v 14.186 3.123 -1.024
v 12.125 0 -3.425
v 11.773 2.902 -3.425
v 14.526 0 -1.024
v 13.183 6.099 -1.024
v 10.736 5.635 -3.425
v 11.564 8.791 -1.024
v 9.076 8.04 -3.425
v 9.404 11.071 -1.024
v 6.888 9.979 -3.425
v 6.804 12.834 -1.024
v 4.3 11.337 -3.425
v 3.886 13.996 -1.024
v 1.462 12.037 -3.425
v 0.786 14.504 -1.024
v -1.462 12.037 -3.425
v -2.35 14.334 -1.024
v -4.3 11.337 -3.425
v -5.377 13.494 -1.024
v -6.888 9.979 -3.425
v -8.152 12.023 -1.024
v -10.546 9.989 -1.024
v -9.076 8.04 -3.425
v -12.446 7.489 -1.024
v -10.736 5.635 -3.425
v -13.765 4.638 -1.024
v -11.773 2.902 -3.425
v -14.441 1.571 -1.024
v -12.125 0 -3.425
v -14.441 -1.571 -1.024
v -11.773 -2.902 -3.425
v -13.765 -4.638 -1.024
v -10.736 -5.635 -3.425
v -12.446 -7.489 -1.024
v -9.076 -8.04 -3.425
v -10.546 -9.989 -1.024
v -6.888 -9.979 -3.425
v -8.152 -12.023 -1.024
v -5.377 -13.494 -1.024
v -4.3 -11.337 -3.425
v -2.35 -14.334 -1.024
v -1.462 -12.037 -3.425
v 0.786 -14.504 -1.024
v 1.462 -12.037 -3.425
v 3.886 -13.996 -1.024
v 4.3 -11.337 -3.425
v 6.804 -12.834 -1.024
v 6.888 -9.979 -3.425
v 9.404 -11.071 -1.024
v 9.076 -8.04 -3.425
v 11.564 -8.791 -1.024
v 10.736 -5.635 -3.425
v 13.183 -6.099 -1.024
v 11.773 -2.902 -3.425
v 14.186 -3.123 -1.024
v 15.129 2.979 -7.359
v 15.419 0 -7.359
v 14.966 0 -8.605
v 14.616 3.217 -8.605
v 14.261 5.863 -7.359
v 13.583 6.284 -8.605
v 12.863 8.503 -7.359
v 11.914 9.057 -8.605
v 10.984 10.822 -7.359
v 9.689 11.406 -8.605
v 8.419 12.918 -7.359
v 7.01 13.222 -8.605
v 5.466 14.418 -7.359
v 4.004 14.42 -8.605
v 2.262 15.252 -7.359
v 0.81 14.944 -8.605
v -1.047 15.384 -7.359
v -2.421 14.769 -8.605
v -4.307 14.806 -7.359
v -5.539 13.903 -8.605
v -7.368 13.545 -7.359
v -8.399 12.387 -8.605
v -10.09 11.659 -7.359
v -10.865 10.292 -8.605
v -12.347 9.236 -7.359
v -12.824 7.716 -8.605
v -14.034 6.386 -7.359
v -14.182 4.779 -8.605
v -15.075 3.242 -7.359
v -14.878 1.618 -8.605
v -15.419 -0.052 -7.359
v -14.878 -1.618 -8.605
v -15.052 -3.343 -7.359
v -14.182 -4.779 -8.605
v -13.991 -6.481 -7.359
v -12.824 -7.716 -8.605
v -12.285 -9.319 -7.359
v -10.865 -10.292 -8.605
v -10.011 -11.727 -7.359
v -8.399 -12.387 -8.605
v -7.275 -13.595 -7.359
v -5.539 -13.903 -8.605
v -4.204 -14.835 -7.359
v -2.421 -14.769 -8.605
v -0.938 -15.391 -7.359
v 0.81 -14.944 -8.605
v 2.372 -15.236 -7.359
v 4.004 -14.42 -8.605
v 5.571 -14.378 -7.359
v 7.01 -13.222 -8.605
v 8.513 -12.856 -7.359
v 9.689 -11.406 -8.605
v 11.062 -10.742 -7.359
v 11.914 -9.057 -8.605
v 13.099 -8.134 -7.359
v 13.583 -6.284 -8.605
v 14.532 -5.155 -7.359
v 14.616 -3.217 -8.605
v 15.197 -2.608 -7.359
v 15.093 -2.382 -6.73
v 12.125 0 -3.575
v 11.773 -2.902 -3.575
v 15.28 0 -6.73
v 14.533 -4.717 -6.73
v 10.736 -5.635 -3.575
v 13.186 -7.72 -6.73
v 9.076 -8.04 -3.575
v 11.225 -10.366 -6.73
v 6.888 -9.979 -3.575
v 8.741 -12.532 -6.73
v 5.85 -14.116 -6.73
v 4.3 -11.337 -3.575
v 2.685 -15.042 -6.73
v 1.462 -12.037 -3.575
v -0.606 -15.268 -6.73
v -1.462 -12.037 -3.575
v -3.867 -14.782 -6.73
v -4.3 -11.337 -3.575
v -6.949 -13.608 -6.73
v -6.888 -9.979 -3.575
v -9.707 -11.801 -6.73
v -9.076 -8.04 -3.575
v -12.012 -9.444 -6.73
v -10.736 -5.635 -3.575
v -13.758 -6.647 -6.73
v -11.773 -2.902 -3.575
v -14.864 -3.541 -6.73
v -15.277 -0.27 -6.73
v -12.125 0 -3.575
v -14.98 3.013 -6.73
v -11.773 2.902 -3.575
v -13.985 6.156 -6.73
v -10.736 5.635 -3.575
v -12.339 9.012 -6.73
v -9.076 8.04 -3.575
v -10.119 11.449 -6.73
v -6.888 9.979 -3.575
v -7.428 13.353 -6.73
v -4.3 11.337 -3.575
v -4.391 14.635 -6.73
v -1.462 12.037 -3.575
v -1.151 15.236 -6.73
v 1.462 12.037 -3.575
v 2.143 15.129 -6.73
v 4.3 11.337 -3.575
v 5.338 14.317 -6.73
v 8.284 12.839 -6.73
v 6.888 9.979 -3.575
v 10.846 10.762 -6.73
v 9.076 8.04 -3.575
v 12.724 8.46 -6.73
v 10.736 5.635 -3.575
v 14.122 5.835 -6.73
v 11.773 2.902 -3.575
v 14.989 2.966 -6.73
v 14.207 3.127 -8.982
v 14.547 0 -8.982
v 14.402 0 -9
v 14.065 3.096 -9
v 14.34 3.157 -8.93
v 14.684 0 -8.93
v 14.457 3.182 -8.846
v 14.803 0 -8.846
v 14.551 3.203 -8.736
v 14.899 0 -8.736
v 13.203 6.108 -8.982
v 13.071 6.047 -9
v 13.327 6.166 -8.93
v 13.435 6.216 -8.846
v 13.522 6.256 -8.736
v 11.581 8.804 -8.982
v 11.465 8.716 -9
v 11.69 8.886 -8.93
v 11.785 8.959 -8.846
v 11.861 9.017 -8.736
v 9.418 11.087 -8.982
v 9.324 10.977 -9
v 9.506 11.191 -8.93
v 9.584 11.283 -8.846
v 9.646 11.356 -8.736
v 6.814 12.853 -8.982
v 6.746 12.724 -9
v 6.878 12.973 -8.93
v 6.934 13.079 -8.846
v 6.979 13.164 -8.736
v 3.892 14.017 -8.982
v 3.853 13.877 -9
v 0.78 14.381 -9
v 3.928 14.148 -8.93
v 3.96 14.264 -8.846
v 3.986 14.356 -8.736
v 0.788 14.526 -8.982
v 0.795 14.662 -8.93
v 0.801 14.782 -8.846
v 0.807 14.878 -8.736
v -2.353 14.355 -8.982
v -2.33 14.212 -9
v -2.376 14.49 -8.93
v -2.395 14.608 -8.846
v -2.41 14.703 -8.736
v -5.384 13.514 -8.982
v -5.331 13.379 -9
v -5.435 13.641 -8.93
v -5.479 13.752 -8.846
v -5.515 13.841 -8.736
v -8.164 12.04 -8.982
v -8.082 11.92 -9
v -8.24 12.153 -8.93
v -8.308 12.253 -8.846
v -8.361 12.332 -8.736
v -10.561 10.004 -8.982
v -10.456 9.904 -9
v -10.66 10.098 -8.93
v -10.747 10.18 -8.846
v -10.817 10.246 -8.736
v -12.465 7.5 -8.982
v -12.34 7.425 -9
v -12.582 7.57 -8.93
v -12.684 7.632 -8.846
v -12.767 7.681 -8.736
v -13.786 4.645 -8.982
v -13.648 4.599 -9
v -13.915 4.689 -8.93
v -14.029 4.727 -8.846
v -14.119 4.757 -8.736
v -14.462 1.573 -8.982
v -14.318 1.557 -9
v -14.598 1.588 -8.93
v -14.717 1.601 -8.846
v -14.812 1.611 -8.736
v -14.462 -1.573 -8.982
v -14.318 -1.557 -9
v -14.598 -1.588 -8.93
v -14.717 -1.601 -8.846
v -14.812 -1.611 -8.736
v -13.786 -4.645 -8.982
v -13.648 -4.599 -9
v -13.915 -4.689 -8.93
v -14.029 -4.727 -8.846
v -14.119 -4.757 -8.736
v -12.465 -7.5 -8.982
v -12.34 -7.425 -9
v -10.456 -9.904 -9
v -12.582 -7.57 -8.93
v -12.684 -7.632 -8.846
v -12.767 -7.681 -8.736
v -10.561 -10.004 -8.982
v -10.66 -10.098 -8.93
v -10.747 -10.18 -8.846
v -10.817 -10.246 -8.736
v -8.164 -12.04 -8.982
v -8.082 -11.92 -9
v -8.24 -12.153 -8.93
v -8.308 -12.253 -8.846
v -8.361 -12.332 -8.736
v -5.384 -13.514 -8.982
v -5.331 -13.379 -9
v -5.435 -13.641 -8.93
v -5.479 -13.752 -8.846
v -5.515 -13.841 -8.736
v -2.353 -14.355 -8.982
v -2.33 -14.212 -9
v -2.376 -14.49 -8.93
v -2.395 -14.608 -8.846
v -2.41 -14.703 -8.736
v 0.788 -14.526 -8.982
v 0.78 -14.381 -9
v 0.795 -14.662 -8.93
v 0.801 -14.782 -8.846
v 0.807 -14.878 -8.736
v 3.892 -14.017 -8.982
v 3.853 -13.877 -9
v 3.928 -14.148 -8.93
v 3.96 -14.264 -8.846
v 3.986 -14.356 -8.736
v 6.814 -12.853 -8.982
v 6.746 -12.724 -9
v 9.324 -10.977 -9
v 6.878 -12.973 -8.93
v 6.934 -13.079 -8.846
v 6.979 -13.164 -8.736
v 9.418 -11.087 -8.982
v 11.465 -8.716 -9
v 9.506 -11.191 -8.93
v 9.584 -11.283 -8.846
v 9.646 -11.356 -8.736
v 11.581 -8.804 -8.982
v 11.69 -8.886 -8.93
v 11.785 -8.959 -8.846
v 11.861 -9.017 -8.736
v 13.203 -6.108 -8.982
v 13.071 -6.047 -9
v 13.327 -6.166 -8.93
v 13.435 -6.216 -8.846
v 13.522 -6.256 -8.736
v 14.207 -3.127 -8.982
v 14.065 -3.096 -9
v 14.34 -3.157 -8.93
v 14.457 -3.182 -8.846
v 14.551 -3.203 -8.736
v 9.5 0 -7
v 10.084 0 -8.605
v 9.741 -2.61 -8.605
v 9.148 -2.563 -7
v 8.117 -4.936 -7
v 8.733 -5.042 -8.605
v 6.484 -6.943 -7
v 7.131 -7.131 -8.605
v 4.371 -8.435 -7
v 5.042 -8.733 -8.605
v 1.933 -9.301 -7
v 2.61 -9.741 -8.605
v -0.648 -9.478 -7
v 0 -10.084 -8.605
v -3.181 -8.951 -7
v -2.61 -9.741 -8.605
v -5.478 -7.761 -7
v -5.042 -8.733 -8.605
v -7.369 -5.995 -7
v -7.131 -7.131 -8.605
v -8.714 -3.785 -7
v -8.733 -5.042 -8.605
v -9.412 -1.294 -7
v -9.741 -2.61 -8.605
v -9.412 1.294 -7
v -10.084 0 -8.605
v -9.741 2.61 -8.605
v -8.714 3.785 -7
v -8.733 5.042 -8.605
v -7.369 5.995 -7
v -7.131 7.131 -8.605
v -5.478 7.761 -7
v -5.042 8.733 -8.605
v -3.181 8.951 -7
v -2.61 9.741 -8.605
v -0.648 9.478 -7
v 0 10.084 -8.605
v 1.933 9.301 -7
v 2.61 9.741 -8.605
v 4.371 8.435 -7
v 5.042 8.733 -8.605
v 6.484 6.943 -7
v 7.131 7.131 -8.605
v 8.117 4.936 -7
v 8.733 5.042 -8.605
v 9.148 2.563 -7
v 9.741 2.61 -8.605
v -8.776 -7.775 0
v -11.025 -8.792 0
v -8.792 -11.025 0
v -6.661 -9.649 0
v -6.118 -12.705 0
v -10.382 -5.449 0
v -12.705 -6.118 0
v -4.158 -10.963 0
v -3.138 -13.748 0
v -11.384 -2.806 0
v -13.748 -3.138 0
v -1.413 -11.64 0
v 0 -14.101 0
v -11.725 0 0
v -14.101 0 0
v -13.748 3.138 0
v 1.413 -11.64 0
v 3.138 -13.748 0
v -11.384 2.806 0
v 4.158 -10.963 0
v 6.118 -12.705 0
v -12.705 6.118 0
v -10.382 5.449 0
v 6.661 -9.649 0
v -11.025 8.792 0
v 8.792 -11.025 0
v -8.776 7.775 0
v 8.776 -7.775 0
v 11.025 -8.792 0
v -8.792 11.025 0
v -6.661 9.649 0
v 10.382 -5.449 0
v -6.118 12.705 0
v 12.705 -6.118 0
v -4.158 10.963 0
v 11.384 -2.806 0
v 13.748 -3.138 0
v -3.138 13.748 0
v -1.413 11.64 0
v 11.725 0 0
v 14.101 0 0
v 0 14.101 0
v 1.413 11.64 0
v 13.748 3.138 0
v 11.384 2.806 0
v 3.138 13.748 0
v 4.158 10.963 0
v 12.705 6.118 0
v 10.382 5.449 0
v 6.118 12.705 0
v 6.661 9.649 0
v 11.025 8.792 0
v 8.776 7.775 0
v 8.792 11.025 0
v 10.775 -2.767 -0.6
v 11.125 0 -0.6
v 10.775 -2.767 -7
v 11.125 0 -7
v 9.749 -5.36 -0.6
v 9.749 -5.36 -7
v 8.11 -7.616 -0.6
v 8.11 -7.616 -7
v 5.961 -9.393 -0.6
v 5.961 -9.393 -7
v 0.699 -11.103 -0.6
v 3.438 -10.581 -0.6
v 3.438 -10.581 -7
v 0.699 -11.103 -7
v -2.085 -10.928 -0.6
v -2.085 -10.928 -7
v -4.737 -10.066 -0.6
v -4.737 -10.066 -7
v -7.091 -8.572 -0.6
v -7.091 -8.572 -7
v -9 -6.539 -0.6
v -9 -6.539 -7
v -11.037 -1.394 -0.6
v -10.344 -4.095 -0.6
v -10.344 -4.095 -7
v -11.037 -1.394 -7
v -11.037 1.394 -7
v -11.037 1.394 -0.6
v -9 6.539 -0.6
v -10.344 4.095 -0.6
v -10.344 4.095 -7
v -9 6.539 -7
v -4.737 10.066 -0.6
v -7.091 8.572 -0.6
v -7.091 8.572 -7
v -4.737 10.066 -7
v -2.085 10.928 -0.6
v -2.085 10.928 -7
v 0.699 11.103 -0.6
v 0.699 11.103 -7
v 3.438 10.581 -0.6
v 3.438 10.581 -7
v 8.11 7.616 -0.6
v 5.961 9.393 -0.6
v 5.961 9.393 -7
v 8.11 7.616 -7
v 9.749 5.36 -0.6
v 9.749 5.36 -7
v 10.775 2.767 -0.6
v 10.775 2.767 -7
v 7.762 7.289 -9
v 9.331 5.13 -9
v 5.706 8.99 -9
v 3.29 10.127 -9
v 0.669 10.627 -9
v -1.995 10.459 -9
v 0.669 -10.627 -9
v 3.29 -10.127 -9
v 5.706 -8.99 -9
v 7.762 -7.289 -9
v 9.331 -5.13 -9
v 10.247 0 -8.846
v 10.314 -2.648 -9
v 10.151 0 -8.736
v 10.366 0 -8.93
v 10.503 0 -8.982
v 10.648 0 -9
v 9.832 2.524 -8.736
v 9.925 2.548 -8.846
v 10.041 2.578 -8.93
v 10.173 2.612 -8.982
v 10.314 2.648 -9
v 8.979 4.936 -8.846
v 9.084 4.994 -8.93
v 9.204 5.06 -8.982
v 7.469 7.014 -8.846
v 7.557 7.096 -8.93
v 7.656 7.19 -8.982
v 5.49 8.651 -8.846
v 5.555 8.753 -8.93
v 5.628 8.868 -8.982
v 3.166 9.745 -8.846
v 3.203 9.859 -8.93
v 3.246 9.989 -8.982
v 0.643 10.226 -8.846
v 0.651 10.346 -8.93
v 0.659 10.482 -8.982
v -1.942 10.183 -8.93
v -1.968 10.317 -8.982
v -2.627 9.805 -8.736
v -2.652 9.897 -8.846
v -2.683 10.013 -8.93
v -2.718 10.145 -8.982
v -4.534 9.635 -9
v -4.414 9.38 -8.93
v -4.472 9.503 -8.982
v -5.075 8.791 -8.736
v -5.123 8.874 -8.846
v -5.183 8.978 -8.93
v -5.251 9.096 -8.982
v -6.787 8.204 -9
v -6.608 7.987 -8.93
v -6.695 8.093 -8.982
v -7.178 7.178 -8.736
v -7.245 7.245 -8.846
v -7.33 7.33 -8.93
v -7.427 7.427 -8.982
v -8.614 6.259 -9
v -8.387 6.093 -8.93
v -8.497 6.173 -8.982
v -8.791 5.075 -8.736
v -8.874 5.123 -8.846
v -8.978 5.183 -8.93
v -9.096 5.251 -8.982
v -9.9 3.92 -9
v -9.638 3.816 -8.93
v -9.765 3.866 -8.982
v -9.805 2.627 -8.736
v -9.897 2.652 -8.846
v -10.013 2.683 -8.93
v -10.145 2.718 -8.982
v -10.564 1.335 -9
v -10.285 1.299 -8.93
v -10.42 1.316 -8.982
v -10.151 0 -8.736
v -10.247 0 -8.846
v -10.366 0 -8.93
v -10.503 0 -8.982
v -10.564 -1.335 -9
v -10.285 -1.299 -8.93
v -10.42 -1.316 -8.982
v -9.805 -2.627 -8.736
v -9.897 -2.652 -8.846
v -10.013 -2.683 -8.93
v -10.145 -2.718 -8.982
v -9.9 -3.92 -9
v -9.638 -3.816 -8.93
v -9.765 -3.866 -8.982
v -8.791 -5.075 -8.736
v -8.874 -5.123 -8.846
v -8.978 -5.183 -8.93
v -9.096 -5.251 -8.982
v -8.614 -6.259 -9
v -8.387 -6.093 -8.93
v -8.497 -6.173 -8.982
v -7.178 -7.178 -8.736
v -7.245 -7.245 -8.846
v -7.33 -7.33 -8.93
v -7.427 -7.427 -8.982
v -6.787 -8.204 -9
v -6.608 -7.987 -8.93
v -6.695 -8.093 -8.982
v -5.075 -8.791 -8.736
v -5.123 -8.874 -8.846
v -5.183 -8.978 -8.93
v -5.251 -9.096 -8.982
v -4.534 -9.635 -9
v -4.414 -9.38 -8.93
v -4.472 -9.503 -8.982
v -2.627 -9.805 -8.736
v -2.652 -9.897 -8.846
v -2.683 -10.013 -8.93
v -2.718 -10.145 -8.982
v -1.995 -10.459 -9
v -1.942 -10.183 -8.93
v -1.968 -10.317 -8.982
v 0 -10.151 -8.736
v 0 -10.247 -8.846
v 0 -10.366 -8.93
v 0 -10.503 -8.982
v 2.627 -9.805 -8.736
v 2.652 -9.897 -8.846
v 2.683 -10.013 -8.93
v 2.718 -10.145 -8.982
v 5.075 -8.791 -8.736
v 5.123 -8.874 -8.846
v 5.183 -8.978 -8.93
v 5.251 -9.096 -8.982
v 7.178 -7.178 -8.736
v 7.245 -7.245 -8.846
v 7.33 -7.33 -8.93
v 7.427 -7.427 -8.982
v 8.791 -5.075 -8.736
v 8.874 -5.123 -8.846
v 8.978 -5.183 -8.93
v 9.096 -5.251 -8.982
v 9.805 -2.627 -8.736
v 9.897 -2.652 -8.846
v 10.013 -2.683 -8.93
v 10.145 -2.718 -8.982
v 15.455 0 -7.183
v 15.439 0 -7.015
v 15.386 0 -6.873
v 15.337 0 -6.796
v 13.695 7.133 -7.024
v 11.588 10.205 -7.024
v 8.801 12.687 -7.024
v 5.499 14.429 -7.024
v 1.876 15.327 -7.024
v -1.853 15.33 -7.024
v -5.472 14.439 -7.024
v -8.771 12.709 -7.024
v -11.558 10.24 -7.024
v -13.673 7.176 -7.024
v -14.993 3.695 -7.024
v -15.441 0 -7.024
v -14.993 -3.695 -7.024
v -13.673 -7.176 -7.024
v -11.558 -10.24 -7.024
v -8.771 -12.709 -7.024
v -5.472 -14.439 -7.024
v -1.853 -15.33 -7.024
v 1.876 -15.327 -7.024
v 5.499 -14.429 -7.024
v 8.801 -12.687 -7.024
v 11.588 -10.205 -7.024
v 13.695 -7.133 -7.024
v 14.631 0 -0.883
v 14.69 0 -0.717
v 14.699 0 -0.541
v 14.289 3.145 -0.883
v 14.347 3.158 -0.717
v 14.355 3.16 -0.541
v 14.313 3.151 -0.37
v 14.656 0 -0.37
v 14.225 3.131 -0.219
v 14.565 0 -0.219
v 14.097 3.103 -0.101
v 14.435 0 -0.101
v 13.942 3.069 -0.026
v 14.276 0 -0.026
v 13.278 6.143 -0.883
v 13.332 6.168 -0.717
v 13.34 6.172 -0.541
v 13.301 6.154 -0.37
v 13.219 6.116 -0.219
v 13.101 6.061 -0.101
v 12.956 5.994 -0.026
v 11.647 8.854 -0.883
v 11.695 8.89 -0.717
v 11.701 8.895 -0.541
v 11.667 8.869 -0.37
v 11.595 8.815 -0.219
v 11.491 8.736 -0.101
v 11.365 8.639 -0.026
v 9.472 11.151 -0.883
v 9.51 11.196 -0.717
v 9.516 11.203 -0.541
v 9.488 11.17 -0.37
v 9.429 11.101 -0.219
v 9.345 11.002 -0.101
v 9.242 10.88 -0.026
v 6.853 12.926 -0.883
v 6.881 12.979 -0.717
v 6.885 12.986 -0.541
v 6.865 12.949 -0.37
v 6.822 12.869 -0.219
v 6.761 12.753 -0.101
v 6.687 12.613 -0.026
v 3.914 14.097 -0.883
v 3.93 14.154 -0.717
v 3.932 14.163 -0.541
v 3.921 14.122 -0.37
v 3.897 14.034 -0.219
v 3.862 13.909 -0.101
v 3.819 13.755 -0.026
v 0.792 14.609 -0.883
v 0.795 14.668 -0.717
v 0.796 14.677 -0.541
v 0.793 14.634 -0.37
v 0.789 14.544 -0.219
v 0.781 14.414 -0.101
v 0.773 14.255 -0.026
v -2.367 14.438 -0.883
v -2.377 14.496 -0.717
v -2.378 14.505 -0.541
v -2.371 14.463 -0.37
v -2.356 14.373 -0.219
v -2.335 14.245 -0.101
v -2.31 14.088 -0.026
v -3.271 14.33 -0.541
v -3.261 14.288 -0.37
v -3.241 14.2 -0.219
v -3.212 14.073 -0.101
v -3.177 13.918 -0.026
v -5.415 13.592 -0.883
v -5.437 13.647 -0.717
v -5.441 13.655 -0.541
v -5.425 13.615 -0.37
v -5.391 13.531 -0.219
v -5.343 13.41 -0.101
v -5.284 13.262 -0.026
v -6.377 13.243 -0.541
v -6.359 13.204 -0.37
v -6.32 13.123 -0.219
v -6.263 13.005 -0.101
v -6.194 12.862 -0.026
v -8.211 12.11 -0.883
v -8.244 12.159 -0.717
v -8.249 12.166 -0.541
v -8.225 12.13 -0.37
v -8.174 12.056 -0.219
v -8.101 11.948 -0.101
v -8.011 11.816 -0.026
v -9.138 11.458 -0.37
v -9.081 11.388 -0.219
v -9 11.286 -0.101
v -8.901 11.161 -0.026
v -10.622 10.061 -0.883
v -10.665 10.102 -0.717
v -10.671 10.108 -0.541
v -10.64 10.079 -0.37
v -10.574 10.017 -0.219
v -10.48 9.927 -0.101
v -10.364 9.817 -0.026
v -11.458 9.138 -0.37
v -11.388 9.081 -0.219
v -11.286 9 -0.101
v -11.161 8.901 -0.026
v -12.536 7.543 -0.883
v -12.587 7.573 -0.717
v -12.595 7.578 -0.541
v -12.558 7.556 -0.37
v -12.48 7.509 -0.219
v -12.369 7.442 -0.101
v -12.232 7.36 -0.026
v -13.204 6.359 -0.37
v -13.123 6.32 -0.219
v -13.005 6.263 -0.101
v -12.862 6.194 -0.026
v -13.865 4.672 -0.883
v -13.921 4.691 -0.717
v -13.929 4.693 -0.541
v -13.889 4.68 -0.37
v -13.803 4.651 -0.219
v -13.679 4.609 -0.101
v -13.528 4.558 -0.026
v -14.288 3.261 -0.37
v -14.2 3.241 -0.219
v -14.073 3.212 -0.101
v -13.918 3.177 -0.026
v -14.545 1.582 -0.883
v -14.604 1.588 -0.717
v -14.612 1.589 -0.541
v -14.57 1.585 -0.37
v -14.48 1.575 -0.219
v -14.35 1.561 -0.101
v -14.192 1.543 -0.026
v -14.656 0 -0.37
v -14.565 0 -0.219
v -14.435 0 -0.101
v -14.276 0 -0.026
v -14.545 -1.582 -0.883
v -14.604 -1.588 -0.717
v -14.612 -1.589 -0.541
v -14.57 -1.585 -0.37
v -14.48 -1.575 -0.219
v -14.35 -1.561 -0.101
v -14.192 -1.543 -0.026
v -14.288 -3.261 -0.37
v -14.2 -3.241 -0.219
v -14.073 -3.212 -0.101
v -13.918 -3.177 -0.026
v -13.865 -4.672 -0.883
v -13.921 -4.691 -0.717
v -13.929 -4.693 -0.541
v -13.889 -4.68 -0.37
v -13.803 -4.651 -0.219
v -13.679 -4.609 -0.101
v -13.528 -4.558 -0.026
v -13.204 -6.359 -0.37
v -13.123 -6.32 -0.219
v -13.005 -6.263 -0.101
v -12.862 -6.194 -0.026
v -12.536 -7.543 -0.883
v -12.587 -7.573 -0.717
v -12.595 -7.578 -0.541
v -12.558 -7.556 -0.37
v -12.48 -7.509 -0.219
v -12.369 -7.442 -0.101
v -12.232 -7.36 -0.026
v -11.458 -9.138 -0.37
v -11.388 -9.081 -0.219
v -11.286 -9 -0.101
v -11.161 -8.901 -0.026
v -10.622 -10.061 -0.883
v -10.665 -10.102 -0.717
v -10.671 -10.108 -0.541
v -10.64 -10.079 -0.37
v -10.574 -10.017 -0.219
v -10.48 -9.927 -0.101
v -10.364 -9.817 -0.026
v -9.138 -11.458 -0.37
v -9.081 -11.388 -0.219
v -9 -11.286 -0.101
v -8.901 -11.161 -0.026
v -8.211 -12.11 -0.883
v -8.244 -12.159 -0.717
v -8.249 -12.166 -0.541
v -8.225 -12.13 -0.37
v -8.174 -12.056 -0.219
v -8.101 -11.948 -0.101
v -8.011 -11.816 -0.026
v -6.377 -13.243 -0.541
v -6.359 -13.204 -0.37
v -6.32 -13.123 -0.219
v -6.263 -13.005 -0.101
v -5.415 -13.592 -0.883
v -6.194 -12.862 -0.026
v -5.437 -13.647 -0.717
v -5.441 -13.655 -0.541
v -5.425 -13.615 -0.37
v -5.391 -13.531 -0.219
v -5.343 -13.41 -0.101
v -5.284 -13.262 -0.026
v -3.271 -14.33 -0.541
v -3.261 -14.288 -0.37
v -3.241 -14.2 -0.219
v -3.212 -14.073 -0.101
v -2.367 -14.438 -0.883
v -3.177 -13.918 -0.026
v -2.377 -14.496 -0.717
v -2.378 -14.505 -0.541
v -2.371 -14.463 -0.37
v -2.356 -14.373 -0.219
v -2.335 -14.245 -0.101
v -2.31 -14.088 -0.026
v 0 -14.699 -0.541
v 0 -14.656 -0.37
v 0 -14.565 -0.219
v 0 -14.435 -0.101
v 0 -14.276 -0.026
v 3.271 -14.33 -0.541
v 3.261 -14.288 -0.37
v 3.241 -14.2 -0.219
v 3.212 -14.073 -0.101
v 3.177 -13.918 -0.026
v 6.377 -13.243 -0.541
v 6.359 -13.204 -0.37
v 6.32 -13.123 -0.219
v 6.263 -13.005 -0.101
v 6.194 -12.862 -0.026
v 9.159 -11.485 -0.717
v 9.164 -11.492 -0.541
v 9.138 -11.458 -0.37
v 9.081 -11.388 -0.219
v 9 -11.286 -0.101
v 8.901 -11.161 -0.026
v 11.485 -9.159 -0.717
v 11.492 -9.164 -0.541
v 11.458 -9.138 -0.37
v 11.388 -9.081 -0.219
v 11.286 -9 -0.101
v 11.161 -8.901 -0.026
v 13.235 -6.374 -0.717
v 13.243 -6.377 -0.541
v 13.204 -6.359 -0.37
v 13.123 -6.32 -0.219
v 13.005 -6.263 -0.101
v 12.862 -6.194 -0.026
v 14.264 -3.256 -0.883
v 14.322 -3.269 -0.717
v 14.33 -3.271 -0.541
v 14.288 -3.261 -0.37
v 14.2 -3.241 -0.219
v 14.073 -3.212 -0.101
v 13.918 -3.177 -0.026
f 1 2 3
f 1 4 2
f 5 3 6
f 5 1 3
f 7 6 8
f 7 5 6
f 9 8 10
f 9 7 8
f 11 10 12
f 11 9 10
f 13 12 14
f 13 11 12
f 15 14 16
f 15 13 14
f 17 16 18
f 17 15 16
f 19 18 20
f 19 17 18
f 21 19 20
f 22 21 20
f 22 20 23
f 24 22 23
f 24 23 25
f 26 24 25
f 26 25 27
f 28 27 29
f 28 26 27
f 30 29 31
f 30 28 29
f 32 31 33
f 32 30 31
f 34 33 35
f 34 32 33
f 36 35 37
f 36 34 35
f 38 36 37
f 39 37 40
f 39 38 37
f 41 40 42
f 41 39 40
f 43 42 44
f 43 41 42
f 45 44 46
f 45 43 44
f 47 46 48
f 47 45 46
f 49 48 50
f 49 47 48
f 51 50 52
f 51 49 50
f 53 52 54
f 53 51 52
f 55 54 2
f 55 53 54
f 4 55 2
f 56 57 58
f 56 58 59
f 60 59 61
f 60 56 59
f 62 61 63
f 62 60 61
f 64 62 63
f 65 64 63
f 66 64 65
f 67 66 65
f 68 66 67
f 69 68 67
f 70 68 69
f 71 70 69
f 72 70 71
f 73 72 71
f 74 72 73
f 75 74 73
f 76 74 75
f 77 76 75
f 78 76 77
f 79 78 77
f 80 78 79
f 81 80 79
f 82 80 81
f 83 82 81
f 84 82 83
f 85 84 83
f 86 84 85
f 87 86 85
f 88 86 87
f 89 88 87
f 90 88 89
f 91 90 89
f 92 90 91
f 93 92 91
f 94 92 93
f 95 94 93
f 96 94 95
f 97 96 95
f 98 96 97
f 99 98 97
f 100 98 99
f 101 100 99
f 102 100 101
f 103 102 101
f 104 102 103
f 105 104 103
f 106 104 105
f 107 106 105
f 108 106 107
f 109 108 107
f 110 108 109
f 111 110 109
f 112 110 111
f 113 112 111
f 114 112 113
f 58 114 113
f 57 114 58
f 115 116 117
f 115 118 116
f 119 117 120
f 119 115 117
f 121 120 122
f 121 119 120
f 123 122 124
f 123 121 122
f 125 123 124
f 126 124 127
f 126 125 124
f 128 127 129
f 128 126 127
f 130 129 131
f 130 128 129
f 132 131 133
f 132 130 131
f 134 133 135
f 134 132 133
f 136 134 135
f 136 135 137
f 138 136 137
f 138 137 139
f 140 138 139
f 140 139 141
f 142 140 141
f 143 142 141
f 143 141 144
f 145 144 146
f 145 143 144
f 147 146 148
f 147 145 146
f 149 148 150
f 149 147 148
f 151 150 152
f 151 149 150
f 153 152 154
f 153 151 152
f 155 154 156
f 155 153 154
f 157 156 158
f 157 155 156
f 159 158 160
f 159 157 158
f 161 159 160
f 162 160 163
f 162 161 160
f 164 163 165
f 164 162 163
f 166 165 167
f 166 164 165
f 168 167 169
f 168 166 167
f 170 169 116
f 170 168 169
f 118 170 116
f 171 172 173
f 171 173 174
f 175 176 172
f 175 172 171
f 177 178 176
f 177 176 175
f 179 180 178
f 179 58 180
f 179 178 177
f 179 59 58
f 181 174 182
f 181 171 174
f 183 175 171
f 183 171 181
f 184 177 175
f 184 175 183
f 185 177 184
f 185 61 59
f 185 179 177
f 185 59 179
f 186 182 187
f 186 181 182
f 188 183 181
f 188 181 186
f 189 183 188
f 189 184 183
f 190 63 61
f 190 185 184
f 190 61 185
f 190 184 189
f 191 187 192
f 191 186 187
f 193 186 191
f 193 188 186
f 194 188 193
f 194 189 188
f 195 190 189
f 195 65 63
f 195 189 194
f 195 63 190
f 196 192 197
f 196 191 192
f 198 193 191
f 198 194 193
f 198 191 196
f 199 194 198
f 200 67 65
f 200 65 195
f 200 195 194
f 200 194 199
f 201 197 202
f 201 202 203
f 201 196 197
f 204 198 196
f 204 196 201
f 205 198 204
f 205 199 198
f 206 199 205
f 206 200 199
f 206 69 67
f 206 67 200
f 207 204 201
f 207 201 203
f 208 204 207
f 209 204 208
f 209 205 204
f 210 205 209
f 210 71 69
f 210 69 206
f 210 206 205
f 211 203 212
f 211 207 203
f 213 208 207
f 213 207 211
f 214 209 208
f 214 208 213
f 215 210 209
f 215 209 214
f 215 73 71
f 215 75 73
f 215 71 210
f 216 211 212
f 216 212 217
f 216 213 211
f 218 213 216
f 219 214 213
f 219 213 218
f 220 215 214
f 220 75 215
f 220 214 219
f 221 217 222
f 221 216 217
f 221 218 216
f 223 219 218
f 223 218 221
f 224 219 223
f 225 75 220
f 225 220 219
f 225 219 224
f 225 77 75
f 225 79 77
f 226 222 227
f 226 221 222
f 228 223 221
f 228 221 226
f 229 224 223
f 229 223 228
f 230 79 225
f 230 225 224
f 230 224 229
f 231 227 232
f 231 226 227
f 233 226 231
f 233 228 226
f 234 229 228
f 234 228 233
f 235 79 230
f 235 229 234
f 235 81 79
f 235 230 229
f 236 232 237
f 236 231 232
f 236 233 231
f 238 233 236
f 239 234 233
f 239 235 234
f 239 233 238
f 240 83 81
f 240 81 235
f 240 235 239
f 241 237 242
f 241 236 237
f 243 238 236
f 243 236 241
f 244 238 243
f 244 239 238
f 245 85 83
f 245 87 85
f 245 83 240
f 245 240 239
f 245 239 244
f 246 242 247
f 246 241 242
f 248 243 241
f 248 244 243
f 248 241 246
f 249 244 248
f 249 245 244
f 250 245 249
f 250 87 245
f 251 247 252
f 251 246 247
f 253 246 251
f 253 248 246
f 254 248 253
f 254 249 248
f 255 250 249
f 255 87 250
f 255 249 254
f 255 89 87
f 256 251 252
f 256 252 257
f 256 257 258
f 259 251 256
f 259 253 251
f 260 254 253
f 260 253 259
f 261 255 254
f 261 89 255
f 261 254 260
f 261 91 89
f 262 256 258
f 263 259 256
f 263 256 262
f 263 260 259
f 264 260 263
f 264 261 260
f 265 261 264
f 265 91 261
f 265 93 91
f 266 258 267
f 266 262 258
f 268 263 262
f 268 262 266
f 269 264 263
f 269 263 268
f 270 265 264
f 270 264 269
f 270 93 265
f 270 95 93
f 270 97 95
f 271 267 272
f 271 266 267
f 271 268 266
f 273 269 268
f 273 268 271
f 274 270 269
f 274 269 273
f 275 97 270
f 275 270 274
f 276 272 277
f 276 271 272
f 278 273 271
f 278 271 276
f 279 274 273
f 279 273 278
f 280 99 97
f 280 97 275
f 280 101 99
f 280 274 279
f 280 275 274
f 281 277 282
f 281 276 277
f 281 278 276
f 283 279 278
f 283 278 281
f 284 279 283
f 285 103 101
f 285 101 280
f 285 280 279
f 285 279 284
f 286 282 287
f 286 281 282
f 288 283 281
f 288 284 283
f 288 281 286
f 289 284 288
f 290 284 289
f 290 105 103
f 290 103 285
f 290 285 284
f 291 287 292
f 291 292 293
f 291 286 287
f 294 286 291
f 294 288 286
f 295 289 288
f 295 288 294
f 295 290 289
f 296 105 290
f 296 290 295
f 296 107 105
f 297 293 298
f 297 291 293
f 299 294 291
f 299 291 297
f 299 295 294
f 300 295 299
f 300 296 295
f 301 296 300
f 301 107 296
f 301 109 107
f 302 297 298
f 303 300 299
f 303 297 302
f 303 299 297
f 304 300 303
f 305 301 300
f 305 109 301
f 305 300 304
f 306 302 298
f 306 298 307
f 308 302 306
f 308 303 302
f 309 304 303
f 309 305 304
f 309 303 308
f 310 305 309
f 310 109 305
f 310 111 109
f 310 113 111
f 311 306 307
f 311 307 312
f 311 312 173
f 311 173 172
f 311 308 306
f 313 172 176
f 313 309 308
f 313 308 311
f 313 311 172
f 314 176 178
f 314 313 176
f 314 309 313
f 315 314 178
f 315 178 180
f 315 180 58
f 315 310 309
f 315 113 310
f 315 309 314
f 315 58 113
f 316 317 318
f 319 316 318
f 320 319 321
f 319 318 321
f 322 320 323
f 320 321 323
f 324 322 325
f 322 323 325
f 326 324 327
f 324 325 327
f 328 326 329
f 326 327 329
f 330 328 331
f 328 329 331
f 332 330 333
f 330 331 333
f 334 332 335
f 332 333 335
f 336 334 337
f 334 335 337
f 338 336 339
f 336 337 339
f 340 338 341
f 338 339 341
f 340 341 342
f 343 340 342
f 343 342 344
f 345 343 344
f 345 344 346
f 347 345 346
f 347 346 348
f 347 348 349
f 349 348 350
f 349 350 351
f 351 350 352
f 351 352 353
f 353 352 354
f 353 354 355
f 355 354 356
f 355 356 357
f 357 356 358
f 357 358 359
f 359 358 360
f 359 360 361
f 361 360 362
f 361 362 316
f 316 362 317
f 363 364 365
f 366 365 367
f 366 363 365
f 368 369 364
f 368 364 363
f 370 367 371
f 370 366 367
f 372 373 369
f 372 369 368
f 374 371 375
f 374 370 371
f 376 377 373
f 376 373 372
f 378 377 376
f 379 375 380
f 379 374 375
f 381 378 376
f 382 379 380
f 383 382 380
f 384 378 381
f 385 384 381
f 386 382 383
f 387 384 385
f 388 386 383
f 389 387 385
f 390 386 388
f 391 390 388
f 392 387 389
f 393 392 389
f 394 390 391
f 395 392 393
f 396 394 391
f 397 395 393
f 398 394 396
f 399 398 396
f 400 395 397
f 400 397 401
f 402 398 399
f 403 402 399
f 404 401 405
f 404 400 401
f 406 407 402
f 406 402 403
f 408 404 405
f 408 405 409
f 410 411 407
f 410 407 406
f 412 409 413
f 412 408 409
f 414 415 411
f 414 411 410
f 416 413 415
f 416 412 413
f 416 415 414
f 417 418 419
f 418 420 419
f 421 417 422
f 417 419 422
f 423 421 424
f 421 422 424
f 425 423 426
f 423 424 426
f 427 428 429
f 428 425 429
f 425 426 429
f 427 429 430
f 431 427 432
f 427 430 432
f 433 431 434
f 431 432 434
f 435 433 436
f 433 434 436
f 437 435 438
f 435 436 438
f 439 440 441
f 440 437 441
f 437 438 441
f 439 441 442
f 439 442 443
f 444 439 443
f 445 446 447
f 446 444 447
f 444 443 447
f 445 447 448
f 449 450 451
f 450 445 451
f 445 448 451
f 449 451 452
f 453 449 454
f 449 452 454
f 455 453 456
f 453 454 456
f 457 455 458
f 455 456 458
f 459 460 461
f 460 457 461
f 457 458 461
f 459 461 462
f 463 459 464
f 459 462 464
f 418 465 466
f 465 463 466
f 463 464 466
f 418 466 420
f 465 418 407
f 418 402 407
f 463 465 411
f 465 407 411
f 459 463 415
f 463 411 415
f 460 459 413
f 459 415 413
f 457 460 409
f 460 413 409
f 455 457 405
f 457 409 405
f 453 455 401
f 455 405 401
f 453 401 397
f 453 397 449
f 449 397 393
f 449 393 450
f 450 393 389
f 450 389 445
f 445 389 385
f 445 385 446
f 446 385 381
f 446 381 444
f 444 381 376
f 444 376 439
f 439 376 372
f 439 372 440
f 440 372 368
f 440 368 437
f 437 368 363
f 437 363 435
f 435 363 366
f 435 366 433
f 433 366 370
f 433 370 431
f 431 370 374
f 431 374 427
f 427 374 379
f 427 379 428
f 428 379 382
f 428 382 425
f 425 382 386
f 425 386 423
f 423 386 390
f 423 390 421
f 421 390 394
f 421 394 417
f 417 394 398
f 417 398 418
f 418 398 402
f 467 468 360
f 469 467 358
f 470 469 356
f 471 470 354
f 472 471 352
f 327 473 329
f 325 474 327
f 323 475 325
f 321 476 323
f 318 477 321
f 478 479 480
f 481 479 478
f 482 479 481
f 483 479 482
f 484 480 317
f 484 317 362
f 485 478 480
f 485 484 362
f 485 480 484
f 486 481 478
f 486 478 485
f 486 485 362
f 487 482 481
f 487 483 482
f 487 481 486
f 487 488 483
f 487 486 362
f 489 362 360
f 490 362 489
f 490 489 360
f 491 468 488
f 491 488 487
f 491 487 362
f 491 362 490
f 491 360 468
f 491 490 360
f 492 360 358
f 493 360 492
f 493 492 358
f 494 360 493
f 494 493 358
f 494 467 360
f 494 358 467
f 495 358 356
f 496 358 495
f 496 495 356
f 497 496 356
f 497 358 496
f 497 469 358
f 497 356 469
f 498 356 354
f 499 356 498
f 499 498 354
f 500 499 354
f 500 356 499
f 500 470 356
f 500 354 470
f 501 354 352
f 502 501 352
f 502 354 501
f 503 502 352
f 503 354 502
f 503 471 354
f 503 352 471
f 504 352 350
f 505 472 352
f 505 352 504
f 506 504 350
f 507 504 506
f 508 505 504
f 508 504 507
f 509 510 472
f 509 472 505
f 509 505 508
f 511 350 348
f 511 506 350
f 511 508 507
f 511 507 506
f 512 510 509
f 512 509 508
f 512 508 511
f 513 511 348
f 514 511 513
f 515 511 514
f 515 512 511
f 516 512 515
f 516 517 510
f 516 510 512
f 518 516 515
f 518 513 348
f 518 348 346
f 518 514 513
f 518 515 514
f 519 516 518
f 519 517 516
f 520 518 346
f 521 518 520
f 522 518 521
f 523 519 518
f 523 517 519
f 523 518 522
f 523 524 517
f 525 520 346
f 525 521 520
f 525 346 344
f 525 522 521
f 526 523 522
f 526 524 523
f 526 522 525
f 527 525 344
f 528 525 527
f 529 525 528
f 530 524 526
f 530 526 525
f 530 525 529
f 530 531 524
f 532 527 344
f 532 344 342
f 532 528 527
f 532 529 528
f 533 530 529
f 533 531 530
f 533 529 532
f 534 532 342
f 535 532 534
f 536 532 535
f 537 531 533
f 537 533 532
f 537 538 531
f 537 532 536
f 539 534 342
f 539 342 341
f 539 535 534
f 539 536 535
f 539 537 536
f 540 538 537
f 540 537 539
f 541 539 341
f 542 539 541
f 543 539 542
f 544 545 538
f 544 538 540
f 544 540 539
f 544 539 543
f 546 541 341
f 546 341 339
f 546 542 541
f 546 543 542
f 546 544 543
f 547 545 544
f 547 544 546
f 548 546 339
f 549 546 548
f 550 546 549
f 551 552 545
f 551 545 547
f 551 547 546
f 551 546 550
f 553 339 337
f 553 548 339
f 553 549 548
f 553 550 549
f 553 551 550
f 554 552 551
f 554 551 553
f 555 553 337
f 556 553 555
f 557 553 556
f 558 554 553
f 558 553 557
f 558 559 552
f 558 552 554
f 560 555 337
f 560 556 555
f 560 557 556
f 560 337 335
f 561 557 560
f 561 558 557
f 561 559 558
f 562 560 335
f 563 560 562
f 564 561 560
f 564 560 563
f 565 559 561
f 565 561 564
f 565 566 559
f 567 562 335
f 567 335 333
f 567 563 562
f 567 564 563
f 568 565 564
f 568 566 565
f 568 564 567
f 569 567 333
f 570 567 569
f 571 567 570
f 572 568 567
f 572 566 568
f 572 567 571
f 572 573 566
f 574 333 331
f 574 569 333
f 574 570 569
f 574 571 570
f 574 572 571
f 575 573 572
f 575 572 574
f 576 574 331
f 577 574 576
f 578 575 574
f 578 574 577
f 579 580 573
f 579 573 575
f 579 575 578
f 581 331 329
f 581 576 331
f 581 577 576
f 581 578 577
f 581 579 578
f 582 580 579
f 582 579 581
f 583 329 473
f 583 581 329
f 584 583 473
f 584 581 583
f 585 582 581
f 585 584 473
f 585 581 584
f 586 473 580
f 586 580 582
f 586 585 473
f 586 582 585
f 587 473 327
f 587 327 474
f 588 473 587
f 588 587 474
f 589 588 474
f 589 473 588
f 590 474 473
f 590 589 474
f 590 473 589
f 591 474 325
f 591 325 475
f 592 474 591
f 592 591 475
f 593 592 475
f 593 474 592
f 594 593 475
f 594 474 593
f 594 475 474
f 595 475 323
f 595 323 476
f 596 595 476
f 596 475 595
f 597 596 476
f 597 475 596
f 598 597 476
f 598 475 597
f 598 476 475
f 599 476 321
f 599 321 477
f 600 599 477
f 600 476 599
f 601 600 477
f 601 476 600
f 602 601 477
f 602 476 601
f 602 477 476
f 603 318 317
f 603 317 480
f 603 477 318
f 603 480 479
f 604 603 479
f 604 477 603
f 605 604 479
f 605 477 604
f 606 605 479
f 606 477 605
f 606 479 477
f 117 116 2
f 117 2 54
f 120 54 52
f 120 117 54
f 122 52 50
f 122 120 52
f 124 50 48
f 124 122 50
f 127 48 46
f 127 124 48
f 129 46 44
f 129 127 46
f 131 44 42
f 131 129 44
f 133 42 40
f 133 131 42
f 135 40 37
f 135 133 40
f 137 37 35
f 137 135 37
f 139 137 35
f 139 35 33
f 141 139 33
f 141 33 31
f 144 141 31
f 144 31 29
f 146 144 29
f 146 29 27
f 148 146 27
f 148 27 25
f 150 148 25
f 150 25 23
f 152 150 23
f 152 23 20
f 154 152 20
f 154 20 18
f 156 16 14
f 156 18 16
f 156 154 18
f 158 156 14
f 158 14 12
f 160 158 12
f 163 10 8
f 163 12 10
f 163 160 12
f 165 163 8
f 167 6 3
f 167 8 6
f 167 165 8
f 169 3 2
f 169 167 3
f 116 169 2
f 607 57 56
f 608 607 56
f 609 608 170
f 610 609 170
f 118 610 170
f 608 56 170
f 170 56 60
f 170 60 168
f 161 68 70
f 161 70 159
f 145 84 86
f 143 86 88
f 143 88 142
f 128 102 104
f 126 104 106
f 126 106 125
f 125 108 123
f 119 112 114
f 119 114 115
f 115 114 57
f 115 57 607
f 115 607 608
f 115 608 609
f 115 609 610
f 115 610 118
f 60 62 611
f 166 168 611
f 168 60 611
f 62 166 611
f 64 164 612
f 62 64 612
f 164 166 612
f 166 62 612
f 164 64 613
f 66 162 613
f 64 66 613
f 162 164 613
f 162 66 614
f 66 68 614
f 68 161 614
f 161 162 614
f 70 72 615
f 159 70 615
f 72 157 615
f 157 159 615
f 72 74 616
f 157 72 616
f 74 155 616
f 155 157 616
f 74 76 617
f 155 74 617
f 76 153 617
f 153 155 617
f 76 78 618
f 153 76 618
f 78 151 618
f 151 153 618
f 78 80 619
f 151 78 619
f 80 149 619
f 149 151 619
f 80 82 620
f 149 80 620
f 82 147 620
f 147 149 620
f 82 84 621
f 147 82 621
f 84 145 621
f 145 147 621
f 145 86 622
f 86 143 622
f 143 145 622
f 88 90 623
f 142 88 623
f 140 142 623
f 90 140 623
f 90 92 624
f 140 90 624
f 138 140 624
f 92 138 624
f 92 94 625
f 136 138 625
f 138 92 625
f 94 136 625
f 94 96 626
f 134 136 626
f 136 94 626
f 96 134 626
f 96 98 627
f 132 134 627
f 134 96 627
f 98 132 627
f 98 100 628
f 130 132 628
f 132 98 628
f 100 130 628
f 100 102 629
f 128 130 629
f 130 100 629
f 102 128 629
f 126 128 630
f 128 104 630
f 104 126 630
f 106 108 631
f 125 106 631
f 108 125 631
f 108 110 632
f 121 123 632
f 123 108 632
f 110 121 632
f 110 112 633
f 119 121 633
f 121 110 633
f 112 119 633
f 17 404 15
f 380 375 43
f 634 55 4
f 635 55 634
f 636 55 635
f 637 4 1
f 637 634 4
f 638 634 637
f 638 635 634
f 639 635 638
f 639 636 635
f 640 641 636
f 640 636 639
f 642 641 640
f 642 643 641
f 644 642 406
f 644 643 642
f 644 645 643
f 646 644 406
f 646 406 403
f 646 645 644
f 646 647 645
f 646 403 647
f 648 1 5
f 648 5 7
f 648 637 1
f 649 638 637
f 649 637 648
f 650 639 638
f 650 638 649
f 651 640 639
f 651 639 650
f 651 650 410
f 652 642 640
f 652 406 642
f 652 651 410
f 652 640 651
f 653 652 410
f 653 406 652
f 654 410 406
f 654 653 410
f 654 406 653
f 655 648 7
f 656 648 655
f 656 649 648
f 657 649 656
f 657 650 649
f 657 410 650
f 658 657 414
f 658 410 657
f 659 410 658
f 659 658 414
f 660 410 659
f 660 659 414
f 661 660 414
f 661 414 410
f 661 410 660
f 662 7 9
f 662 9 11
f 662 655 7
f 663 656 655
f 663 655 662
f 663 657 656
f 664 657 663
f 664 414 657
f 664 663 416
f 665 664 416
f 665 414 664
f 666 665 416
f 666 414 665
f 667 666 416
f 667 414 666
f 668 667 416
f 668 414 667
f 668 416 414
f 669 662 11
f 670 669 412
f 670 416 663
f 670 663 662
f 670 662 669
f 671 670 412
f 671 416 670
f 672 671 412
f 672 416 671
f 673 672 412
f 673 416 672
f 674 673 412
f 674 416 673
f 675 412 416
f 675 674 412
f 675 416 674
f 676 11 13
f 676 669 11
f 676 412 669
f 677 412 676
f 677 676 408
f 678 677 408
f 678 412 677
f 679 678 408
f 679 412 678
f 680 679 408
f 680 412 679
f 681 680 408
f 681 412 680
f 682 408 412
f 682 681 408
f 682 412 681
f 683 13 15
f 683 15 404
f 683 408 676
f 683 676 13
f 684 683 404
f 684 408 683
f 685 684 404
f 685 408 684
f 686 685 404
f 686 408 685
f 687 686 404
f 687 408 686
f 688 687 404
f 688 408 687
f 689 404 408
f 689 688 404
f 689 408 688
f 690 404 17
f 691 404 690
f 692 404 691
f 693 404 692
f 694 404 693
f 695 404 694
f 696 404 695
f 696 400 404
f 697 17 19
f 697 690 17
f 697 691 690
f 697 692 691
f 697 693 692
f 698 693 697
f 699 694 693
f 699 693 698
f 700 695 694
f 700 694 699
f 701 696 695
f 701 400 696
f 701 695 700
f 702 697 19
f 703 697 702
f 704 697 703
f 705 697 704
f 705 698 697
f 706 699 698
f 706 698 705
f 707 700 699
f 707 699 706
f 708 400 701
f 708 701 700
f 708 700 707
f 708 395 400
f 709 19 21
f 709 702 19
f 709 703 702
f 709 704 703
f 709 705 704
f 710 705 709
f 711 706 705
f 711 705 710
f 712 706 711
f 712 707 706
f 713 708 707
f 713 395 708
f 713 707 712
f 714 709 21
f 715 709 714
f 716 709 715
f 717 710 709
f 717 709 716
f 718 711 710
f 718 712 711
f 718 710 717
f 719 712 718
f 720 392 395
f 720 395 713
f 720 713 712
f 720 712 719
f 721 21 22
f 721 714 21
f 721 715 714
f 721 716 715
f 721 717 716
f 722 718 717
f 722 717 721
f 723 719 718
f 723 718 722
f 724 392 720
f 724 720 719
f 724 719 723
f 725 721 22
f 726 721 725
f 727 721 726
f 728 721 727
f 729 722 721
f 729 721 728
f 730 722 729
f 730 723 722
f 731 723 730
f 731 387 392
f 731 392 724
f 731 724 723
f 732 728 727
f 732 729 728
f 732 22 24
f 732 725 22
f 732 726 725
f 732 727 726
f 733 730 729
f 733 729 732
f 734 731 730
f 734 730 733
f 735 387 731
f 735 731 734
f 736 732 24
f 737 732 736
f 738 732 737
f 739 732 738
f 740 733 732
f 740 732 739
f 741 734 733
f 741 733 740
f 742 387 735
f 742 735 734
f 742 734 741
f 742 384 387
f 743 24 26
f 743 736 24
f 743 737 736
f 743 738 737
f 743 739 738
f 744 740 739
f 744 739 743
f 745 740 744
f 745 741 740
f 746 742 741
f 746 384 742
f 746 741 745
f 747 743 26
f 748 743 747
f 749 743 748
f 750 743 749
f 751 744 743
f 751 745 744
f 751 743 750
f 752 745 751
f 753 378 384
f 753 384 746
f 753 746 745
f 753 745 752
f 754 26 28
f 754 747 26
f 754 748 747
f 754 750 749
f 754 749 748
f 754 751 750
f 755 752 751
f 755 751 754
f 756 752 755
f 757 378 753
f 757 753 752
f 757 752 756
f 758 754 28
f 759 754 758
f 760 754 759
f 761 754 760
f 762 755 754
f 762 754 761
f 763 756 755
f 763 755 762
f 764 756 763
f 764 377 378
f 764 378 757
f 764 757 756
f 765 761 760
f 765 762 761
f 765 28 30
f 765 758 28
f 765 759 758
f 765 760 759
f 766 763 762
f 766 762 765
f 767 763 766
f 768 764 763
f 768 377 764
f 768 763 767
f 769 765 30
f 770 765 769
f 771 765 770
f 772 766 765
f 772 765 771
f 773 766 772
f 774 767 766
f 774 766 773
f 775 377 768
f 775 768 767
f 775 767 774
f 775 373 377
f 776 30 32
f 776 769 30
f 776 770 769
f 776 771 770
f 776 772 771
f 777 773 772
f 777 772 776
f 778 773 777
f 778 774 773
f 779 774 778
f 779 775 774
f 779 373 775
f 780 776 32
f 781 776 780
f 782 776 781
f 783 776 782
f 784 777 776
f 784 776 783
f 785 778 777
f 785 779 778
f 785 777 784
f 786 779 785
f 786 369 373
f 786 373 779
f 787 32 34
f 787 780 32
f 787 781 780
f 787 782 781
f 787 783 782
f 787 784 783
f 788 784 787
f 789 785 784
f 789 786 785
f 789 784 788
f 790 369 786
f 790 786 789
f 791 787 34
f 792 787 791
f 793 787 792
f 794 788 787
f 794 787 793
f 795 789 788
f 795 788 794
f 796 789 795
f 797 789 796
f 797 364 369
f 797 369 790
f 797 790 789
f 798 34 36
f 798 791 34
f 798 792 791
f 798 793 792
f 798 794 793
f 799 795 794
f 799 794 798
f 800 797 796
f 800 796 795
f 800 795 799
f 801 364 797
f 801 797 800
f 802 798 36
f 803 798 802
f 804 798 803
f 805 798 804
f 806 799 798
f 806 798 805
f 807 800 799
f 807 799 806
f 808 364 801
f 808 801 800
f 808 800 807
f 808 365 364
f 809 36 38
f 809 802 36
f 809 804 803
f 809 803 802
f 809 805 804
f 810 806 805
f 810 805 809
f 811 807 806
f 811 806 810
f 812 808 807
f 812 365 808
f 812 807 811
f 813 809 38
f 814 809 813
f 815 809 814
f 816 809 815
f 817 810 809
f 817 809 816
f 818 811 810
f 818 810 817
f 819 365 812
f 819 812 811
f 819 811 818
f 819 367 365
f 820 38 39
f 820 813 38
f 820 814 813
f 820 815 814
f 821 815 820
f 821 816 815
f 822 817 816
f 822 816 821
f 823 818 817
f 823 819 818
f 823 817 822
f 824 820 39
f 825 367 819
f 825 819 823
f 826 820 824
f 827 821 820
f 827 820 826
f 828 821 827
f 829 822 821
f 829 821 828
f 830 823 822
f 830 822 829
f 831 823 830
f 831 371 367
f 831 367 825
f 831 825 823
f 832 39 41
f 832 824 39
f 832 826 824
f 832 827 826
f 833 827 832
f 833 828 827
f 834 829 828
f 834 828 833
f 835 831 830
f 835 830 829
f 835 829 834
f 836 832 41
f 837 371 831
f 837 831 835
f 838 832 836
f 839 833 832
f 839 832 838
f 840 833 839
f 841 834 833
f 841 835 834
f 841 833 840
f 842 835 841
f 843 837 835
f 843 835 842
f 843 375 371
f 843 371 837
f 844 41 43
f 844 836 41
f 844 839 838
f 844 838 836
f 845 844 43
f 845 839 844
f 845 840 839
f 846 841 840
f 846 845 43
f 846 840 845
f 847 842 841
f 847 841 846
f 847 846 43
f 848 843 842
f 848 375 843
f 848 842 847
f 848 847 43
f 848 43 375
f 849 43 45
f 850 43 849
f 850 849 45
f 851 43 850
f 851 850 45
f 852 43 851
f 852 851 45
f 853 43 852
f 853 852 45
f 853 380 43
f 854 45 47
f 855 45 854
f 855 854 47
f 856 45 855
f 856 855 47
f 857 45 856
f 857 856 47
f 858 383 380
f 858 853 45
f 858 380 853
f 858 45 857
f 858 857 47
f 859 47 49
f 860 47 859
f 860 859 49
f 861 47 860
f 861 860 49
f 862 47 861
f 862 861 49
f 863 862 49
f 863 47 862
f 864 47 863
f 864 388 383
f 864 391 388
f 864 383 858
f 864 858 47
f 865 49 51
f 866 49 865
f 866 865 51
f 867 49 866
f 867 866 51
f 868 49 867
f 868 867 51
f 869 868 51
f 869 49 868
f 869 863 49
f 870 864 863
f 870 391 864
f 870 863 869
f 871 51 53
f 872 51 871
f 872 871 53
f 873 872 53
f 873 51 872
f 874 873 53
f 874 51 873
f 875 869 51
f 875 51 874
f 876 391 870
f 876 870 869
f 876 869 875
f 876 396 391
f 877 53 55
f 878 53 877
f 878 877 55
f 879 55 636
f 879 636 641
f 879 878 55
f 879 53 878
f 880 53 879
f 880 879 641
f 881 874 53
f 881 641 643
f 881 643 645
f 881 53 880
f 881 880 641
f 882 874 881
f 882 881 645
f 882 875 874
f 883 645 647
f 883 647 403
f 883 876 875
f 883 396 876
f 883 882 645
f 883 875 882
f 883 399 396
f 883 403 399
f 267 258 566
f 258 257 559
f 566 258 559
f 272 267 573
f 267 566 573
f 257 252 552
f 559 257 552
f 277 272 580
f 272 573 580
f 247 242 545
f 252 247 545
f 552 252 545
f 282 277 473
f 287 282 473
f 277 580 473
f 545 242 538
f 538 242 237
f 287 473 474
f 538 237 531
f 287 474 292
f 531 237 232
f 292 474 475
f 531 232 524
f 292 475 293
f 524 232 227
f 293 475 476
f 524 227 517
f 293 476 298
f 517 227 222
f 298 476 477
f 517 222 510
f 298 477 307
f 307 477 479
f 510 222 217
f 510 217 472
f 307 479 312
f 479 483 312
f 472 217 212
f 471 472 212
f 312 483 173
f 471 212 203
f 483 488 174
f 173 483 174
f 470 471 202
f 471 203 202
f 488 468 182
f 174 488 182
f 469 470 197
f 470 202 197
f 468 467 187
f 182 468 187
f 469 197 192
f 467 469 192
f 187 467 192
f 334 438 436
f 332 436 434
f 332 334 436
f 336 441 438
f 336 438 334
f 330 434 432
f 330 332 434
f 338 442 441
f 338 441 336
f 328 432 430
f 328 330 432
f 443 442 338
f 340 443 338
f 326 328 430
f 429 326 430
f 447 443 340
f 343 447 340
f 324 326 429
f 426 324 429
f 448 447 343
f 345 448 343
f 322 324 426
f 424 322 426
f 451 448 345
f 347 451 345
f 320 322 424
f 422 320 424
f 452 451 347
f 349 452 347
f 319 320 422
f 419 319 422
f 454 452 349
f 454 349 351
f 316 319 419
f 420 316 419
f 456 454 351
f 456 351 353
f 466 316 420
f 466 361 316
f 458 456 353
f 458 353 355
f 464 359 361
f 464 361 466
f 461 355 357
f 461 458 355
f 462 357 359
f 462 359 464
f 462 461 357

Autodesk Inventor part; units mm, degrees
ref_plane "YZ Plane" through (0, 0, 0) normal (1, 0, 0) x (0, 1, 0)
ref_plane "XZ Plane" through (0, 0, 0) normal (0, 1, 0) x (-1, 0, 0)
ref_plane "XY Plane" through (0, 0, 0) normal (0, 0, 1) x (1, 0, 0)
ref_plane "Work Plane1" through (0, 0, 0) normal (0, 0, 1) x (1, 0, 0)
sketch "Sketch1" plane through (0, 0, 0) normal (0, 1, 0) x (-1, 0, 0)
  line L0 (-11.125, -7) -> (11.125, -7)
  line L1 (11.125, -7) -> (11.125, 0)
  line L2 (11.125, 0) -> (-11.125, 0)
  line L3 (-11.125, 0) -> (-11.125, -7)
  line L4 (-11.125, -7) -> (11.125, 0) construction
  line L5 (11.125, -7) -> (-11.125, 0) construction
  line L6 (0, -3.5) -> (0, 0) construction
  line L7 (-11.125, 0) -> (-15.55, 0)
  line L8 (-15.55, 0) -> (-12.125, -3.425)
  line L9 (-12.125, -3.575) -> (-15.55, -7)
  line L10 (-15.55, -7) -> (-11.125, -7) construction
  line L11 (-12.125, -3.425) -> (-12.125, -3.575)
  line L12 (-15.55, -7) -> (-14.8221, -9)
  line L13 (-14.8221, -9) -> (-10.2279, -9)
  line L14 (-10.2279, -9) -> (-9.5, -7)
  dimension "d0" = 22.25
  dimension "d1" = 7
  dimension "d3" = 45
  dimension "d4" = 45
  dimension "d6" = 70
  dimension "d7" = 2
  dimension "d8" = 19
  dimension "d9" = 70
  dimension "d16" = 1
  dimension "d17" = 31.1
revolve "Revolution1" add sketch "Sketch1" angle 360 about axis through (0, 0, -3.5) along (0, 0, 1) contours L0 L14 L13 L12 L9 L11 L8 L7 L3
fillet "Fillet1" radius 0.6 4 edges at (-15.55, 0, 0) (-15.55, 0, -7) (-14.8221, 0, -9) (-10.2279, 0, -9)
chamfer "Chamfer1" distance 0.6 angle 45 1 edges at (-11.125, 0, 0)
properties part number "vroller_3DPrint"
